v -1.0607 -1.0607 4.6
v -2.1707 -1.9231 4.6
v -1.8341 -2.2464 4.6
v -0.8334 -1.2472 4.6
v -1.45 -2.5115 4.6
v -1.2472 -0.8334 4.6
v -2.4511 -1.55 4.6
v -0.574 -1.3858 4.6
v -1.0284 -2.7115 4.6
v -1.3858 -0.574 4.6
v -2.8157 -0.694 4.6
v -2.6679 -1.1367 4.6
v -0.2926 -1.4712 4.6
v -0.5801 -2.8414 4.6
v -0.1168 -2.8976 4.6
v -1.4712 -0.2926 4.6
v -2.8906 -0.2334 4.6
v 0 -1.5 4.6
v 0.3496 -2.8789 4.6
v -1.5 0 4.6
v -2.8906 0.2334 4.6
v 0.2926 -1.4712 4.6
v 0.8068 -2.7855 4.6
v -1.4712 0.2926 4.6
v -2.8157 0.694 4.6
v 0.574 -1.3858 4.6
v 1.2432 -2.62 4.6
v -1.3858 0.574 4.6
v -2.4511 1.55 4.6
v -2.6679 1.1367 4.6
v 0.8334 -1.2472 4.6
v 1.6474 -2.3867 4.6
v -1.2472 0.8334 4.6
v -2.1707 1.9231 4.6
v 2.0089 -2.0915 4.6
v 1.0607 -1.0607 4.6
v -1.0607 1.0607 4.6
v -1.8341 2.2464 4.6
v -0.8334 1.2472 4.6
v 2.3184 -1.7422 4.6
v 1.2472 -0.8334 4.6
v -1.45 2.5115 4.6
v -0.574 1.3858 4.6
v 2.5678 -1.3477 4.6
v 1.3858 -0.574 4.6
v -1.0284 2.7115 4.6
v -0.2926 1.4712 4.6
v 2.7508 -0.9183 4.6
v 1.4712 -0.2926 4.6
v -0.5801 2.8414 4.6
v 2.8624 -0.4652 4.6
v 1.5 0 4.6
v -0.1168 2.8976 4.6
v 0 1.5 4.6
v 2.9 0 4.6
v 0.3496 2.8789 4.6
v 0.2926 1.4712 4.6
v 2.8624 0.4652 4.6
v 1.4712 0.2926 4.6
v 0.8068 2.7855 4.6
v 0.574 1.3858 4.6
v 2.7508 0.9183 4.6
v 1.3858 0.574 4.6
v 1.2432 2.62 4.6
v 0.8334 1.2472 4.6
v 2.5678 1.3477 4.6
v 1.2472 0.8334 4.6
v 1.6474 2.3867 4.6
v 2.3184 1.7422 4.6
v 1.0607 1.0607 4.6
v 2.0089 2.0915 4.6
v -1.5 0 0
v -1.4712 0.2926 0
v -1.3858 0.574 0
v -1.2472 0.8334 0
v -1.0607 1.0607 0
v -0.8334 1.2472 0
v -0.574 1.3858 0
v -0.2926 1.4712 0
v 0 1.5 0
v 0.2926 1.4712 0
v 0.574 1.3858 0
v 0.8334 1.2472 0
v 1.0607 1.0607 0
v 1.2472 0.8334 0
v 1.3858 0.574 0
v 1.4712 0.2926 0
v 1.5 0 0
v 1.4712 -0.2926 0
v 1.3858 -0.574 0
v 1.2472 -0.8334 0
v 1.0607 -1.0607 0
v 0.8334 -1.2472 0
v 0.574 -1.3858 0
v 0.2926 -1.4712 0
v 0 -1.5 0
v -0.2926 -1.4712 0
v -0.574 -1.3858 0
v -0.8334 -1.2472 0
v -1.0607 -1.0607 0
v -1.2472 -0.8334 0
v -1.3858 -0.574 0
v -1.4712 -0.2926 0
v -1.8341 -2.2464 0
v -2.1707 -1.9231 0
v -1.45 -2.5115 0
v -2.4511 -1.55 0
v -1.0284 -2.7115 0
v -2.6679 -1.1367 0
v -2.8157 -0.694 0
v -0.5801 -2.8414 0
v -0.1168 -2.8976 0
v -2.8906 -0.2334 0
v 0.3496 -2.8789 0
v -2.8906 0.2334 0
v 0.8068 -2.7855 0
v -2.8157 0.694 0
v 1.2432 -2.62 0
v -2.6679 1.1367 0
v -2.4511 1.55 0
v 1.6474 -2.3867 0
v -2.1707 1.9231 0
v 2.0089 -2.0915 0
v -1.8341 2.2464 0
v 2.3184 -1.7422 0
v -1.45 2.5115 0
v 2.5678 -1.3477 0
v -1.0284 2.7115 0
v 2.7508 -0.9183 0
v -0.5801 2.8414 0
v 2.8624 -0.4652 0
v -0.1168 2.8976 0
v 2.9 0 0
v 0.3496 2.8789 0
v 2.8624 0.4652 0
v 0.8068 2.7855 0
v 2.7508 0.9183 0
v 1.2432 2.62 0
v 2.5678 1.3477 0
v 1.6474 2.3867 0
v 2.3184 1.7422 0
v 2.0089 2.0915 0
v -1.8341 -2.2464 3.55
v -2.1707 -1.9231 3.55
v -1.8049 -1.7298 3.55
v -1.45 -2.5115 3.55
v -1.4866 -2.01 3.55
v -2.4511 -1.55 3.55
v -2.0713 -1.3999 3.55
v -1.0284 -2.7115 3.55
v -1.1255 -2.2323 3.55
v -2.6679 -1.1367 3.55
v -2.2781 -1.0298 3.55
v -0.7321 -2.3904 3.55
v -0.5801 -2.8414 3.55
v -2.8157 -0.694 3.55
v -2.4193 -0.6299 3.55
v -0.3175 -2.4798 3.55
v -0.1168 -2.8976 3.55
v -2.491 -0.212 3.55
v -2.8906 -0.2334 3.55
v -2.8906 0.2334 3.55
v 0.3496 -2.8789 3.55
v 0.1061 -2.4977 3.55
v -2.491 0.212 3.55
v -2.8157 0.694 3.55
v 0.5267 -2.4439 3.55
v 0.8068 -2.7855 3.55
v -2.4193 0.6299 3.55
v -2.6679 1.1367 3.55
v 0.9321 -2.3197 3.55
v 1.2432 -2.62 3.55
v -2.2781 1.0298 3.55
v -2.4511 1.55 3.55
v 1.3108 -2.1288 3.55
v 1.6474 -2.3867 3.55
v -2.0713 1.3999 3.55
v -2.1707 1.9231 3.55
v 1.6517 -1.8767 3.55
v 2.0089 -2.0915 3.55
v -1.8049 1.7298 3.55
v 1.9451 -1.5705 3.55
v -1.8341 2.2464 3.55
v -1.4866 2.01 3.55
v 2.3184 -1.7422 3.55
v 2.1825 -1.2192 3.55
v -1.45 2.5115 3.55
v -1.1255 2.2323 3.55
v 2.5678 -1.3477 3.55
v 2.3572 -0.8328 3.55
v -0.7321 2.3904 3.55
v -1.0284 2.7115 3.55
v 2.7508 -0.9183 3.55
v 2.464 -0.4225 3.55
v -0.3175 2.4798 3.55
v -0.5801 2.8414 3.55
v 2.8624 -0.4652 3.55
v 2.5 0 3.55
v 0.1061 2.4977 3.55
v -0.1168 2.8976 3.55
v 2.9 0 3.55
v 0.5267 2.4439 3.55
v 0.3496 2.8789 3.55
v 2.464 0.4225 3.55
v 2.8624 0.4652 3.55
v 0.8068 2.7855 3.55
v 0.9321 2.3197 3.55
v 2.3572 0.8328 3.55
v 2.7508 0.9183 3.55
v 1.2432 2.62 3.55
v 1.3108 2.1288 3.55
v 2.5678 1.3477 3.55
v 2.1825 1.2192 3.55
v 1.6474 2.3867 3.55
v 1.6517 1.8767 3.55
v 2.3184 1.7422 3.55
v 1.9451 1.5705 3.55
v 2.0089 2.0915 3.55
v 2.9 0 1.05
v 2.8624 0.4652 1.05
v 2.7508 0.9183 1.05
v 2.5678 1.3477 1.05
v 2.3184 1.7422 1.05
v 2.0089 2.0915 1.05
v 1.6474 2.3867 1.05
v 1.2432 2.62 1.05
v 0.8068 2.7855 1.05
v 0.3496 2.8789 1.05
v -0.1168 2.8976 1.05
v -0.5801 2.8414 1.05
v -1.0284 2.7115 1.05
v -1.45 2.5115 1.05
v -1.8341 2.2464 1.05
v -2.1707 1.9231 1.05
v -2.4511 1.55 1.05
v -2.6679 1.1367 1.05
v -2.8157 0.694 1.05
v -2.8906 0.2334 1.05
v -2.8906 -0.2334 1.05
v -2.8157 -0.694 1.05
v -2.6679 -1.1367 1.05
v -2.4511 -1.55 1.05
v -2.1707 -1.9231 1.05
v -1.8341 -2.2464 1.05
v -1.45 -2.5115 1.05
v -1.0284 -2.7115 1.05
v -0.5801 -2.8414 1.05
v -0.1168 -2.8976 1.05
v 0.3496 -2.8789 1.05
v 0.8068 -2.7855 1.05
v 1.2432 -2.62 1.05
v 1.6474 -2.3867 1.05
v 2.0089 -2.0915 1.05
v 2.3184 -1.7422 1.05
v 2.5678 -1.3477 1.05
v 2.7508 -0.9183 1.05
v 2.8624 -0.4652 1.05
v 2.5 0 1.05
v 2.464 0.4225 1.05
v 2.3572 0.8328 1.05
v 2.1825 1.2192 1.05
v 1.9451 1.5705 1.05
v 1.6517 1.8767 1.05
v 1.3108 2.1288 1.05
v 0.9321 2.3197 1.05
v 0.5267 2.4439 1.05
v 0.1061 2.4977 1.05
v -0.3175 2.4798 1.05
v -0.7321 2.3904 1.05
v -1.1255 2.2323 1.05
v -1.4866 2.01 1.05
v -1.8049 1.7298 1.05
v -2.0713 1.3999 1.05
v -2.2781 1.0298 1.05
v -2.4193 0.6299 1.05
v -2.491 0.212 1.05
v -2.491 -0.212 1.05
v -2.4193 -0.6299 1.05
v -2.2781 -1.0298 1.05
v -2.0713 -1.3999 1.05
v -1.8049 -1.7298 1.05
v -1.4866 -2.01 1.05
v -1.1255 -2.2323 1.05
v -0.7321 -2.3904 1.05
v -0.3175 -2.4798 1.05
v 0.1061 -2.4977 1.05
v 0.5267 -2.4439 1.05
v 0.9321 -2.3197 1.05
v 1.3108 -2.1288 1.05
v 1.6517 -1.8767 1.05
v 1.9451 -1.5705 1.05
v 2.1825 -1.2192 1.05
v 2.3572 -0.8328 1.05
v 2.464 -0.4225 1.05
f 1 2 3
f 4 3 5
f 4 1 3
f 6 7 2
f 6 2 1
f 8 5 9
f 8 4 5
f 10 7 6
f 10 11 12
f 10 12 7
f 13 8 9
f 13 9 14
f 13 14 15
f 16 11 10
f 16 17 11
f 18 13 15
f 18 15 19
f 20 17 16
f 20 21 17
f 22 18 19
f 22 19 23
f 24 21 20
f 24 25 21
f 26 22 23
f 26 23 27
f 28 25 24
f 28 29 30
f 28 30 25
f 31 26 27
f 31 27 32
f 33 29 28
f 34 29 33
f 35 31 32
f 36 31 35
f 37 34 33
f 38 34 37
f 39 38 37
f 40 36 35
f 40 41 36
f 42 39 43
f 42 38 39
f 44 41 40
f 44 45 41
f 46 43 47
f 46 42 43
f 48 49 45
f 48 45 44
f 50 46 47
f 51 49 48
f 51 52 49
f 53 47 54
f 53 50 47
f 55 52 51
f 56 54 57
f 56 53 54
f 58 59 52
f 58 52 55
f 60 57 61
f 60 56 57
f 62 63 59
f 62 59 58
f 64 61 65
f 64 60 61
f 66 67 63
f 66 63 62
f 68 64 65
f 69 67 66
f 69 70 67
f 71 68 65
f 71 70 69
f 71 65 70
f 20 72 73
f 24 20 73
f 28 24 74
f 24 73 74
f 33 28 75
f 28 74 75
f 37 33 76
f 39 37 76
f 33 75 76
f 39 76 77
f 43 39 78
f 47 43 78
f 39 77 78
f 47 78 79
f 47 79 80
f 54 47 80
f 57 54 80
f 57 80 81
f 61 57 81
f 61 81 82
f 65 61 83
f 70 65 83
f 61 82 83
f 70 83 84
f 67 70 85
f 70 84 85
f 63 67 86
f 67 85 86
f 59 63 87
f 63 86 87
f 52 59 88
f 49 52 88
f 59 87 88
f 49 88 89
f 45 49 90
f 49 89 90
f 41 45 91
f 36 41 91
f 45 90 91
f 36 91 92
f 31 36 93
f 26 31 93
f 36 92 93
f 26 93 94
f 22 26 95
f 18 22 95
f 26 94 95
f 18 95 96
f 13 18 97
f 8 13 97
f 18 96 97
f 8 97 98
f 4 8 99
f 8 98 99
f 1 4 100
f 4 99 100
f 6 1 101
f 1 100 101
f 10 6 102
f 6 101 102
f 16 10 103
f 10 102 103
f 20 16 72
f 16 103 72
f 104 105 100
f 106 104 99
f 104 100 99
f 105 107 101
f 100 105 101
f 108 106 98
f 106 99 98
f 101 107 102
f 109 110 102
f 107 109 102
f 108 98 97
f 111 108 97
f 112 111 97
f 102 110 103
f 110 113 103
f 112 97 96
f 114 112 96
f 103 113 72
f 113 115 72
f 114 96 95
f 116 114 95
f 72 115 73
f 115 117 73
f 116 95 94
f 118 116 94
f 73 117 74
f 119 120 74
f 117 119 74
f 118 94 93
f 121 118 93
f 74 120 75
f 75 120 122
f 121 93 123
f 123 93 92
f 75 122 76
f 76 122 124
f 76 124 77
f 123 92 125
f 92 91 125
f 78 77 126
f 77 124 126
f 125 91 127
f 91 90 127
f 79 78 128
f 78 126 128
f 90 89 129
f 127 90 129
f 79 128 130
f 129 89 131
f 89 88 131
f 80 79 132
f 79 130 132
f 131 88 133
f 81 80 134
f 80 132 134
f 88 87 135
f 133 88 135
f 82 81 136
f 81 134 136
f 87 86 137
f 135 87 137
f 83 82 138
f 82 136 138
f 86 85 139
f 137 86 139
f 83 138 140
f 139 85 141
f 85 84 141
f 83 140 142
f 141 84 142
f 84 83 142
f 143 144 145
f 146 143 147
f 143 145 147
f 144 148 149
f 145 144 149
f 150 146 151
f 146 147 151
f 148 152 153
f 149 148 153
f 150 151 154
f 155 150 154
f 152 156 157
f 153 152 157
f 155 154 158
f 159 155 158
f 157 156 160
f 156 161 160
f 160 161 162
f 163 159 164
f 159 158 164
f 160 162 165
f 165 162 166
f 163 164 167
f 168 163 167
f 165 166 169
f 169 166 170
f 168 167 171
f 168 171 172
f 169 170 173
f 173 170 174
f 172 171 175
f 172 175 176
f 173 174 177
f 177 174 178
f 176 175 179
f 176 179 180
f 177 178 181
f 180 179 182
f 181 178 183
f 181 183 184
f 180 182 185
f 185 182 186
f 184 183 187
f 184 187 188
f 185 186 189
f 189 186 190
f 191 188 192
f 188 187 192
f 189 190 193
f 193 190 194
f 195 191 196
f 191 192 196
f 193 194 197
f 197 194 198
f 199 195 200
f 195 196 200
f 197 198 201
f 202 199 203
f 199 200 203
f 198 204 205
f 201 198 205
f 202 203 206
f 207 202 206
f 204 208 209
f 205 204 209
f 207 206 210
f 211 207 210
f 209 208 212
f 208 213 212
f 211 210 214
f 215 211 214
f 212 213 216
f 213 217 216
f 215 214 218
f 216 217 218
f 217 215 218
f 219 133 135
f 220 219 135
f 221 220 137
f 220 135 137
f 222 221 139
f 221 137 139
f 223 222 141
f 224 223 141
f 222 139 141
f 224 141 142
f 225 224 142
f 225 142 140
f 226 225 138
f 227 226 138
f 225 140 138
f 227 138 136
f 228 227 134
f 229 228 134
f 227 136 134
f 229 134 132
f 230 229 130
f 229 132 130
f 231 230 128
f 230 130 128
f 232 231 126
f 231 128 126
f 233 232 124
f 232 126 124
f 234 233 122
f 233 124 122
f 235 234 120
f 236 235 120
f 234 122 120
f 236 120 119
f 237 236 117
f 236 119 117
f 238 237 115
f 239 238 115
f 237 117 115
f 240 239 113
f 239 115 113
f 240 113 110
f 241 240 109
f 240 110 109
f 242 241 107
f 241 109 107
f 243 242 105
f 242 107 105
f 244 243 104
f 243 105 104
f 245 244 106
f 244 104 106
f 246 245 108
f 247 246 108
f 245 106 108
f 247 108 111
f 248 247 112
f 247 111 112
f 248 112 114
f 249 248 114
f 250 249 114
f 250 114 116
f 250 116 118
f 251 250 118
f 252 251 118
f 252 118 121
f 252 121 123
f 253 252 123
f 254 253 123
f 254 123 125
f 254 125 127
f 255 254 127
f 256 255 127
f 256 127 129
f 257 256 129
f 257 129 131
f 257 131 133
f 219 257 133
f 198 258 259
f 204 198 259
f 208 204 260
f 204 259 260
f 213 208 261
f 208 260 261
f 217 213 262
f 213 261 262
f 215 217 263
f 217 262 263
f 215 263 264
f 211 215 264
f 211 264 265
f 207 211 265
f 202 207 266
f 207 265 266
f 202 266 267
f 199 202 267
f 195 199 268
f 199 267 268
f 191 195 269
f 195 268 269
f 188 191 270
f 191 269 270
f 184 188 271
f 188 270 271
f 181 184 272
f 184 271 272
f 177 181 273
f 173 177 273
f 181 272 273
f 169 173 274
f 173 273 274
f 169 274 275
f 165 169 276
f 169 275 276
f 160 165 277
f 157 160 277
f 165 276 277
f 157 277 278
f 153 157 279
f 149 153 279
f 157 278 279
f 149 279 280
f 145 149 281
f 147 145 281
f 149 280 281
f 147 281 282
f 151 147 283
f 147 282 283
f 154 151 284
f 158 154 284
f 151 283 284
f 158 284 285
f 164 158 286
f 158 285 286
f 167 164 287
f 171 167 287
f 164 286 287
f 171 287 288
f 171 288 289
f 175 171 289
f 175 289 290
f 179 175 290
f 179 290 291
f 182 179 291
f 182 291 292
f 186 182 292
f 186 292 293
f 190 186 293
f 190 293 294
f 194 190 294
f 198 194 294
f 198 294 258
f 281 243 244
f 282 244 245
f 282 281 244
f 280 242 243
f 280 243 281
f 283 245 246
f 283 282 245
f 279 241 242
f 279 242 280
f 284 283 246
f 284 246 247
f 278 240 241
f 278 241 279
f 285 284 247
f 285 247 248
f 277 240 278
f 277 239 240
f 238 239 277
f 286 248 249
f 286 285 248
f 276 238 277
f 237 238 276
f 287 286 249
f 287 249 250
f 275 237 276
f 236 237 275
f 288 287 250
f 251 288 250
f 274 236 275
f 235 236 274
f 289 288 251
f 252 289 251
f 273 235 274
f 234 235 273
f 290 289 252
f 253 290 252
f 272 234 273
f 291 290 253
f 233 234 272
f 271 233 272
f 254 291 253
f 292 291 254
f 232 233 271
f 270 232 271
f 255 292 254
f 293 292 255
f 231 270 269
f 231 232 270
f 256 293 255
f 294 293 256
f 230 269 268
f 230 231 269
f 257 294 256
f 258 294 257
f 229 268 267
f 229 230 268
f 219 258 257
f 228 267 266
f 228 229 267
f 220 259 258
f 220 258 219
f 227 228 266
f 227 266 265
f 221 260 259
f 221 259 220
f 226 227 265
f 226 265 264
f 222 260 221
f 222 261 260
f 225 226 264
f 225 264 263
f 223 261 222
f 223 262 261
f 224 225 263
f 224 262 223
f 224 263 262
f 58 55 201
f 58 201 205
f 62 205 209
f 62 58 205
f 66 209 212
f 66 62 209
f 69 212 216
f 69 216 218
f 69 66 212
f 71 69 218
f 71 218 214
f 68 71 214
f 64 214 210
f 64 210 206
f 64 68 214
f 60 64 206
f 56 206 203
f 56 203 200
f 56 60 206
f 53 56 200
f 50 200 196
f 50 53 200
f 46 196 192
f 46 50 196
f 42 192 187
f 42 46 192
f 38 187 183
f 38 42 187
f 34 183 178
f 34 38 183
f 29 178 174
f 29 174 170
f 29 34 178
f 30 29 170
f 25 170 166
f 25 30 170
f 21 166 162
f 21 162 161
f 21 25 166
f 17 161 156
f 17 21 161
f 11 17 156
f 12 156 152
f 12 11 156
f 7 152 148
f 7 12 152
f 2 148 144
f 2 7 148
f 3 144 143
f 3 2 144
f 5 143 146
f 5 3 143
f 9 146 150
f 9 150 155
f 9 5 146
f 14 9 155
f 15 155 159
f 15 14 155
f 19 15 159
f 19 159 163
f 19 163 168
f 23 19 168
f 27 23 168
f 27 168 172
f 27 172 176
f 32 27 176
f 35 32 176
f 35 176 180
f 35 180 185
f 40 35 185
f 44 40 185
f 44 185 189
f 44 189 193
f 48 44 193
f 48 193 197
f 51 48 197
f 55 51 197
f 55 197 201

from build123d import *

# Parameters (mm, degrees)
SKETCH1_R           = 2.9
BOSS_EXTRUDE1_DEPTH = 1.05
SKETCH2_R           = 2.5
BOSS_EXTRUDE2_DEPTH = 2.5
SKETCH3_R           = 1.5
CUT_EXTRUDE1_DEPTH  = 4.6


with BuildPart() as part:
    # Sketch1 → Boss-Extrude1 (new body)
    with BuildSketch(Plane.XY):
        Circle(SKETCH1_R)
    boss_extrude1 = extrude(amount=BOSS_EXTRUDE1_DEPTH)

    # Sketch2 → Boss-Extrude2 (add)
    with BuildSketch(Plane.XY.offset(1.05)):
        Circle(SKETCH2_R)
    extrude(amount=BOSS_EXTRUDE2_DEPTH)

    # Mirror1: Boss-Extrude1 across plane
    add(boss_extrude1.mirror(Plane.XY.offset(2.3)))

    # Sketch3 → Cut-Extrude1 (cut)
    with BuildSketch(Plane(origin=(0, 0, 0), x_dir=(-1, 0, 0), z_dir=(0, 0, -1))):
        Circle(SKETCH3_R)
    extrude(amount=-CUT_EXTRUDE1_DEPTH, mode=Mode.SUBTRACT)


solid = part.part
